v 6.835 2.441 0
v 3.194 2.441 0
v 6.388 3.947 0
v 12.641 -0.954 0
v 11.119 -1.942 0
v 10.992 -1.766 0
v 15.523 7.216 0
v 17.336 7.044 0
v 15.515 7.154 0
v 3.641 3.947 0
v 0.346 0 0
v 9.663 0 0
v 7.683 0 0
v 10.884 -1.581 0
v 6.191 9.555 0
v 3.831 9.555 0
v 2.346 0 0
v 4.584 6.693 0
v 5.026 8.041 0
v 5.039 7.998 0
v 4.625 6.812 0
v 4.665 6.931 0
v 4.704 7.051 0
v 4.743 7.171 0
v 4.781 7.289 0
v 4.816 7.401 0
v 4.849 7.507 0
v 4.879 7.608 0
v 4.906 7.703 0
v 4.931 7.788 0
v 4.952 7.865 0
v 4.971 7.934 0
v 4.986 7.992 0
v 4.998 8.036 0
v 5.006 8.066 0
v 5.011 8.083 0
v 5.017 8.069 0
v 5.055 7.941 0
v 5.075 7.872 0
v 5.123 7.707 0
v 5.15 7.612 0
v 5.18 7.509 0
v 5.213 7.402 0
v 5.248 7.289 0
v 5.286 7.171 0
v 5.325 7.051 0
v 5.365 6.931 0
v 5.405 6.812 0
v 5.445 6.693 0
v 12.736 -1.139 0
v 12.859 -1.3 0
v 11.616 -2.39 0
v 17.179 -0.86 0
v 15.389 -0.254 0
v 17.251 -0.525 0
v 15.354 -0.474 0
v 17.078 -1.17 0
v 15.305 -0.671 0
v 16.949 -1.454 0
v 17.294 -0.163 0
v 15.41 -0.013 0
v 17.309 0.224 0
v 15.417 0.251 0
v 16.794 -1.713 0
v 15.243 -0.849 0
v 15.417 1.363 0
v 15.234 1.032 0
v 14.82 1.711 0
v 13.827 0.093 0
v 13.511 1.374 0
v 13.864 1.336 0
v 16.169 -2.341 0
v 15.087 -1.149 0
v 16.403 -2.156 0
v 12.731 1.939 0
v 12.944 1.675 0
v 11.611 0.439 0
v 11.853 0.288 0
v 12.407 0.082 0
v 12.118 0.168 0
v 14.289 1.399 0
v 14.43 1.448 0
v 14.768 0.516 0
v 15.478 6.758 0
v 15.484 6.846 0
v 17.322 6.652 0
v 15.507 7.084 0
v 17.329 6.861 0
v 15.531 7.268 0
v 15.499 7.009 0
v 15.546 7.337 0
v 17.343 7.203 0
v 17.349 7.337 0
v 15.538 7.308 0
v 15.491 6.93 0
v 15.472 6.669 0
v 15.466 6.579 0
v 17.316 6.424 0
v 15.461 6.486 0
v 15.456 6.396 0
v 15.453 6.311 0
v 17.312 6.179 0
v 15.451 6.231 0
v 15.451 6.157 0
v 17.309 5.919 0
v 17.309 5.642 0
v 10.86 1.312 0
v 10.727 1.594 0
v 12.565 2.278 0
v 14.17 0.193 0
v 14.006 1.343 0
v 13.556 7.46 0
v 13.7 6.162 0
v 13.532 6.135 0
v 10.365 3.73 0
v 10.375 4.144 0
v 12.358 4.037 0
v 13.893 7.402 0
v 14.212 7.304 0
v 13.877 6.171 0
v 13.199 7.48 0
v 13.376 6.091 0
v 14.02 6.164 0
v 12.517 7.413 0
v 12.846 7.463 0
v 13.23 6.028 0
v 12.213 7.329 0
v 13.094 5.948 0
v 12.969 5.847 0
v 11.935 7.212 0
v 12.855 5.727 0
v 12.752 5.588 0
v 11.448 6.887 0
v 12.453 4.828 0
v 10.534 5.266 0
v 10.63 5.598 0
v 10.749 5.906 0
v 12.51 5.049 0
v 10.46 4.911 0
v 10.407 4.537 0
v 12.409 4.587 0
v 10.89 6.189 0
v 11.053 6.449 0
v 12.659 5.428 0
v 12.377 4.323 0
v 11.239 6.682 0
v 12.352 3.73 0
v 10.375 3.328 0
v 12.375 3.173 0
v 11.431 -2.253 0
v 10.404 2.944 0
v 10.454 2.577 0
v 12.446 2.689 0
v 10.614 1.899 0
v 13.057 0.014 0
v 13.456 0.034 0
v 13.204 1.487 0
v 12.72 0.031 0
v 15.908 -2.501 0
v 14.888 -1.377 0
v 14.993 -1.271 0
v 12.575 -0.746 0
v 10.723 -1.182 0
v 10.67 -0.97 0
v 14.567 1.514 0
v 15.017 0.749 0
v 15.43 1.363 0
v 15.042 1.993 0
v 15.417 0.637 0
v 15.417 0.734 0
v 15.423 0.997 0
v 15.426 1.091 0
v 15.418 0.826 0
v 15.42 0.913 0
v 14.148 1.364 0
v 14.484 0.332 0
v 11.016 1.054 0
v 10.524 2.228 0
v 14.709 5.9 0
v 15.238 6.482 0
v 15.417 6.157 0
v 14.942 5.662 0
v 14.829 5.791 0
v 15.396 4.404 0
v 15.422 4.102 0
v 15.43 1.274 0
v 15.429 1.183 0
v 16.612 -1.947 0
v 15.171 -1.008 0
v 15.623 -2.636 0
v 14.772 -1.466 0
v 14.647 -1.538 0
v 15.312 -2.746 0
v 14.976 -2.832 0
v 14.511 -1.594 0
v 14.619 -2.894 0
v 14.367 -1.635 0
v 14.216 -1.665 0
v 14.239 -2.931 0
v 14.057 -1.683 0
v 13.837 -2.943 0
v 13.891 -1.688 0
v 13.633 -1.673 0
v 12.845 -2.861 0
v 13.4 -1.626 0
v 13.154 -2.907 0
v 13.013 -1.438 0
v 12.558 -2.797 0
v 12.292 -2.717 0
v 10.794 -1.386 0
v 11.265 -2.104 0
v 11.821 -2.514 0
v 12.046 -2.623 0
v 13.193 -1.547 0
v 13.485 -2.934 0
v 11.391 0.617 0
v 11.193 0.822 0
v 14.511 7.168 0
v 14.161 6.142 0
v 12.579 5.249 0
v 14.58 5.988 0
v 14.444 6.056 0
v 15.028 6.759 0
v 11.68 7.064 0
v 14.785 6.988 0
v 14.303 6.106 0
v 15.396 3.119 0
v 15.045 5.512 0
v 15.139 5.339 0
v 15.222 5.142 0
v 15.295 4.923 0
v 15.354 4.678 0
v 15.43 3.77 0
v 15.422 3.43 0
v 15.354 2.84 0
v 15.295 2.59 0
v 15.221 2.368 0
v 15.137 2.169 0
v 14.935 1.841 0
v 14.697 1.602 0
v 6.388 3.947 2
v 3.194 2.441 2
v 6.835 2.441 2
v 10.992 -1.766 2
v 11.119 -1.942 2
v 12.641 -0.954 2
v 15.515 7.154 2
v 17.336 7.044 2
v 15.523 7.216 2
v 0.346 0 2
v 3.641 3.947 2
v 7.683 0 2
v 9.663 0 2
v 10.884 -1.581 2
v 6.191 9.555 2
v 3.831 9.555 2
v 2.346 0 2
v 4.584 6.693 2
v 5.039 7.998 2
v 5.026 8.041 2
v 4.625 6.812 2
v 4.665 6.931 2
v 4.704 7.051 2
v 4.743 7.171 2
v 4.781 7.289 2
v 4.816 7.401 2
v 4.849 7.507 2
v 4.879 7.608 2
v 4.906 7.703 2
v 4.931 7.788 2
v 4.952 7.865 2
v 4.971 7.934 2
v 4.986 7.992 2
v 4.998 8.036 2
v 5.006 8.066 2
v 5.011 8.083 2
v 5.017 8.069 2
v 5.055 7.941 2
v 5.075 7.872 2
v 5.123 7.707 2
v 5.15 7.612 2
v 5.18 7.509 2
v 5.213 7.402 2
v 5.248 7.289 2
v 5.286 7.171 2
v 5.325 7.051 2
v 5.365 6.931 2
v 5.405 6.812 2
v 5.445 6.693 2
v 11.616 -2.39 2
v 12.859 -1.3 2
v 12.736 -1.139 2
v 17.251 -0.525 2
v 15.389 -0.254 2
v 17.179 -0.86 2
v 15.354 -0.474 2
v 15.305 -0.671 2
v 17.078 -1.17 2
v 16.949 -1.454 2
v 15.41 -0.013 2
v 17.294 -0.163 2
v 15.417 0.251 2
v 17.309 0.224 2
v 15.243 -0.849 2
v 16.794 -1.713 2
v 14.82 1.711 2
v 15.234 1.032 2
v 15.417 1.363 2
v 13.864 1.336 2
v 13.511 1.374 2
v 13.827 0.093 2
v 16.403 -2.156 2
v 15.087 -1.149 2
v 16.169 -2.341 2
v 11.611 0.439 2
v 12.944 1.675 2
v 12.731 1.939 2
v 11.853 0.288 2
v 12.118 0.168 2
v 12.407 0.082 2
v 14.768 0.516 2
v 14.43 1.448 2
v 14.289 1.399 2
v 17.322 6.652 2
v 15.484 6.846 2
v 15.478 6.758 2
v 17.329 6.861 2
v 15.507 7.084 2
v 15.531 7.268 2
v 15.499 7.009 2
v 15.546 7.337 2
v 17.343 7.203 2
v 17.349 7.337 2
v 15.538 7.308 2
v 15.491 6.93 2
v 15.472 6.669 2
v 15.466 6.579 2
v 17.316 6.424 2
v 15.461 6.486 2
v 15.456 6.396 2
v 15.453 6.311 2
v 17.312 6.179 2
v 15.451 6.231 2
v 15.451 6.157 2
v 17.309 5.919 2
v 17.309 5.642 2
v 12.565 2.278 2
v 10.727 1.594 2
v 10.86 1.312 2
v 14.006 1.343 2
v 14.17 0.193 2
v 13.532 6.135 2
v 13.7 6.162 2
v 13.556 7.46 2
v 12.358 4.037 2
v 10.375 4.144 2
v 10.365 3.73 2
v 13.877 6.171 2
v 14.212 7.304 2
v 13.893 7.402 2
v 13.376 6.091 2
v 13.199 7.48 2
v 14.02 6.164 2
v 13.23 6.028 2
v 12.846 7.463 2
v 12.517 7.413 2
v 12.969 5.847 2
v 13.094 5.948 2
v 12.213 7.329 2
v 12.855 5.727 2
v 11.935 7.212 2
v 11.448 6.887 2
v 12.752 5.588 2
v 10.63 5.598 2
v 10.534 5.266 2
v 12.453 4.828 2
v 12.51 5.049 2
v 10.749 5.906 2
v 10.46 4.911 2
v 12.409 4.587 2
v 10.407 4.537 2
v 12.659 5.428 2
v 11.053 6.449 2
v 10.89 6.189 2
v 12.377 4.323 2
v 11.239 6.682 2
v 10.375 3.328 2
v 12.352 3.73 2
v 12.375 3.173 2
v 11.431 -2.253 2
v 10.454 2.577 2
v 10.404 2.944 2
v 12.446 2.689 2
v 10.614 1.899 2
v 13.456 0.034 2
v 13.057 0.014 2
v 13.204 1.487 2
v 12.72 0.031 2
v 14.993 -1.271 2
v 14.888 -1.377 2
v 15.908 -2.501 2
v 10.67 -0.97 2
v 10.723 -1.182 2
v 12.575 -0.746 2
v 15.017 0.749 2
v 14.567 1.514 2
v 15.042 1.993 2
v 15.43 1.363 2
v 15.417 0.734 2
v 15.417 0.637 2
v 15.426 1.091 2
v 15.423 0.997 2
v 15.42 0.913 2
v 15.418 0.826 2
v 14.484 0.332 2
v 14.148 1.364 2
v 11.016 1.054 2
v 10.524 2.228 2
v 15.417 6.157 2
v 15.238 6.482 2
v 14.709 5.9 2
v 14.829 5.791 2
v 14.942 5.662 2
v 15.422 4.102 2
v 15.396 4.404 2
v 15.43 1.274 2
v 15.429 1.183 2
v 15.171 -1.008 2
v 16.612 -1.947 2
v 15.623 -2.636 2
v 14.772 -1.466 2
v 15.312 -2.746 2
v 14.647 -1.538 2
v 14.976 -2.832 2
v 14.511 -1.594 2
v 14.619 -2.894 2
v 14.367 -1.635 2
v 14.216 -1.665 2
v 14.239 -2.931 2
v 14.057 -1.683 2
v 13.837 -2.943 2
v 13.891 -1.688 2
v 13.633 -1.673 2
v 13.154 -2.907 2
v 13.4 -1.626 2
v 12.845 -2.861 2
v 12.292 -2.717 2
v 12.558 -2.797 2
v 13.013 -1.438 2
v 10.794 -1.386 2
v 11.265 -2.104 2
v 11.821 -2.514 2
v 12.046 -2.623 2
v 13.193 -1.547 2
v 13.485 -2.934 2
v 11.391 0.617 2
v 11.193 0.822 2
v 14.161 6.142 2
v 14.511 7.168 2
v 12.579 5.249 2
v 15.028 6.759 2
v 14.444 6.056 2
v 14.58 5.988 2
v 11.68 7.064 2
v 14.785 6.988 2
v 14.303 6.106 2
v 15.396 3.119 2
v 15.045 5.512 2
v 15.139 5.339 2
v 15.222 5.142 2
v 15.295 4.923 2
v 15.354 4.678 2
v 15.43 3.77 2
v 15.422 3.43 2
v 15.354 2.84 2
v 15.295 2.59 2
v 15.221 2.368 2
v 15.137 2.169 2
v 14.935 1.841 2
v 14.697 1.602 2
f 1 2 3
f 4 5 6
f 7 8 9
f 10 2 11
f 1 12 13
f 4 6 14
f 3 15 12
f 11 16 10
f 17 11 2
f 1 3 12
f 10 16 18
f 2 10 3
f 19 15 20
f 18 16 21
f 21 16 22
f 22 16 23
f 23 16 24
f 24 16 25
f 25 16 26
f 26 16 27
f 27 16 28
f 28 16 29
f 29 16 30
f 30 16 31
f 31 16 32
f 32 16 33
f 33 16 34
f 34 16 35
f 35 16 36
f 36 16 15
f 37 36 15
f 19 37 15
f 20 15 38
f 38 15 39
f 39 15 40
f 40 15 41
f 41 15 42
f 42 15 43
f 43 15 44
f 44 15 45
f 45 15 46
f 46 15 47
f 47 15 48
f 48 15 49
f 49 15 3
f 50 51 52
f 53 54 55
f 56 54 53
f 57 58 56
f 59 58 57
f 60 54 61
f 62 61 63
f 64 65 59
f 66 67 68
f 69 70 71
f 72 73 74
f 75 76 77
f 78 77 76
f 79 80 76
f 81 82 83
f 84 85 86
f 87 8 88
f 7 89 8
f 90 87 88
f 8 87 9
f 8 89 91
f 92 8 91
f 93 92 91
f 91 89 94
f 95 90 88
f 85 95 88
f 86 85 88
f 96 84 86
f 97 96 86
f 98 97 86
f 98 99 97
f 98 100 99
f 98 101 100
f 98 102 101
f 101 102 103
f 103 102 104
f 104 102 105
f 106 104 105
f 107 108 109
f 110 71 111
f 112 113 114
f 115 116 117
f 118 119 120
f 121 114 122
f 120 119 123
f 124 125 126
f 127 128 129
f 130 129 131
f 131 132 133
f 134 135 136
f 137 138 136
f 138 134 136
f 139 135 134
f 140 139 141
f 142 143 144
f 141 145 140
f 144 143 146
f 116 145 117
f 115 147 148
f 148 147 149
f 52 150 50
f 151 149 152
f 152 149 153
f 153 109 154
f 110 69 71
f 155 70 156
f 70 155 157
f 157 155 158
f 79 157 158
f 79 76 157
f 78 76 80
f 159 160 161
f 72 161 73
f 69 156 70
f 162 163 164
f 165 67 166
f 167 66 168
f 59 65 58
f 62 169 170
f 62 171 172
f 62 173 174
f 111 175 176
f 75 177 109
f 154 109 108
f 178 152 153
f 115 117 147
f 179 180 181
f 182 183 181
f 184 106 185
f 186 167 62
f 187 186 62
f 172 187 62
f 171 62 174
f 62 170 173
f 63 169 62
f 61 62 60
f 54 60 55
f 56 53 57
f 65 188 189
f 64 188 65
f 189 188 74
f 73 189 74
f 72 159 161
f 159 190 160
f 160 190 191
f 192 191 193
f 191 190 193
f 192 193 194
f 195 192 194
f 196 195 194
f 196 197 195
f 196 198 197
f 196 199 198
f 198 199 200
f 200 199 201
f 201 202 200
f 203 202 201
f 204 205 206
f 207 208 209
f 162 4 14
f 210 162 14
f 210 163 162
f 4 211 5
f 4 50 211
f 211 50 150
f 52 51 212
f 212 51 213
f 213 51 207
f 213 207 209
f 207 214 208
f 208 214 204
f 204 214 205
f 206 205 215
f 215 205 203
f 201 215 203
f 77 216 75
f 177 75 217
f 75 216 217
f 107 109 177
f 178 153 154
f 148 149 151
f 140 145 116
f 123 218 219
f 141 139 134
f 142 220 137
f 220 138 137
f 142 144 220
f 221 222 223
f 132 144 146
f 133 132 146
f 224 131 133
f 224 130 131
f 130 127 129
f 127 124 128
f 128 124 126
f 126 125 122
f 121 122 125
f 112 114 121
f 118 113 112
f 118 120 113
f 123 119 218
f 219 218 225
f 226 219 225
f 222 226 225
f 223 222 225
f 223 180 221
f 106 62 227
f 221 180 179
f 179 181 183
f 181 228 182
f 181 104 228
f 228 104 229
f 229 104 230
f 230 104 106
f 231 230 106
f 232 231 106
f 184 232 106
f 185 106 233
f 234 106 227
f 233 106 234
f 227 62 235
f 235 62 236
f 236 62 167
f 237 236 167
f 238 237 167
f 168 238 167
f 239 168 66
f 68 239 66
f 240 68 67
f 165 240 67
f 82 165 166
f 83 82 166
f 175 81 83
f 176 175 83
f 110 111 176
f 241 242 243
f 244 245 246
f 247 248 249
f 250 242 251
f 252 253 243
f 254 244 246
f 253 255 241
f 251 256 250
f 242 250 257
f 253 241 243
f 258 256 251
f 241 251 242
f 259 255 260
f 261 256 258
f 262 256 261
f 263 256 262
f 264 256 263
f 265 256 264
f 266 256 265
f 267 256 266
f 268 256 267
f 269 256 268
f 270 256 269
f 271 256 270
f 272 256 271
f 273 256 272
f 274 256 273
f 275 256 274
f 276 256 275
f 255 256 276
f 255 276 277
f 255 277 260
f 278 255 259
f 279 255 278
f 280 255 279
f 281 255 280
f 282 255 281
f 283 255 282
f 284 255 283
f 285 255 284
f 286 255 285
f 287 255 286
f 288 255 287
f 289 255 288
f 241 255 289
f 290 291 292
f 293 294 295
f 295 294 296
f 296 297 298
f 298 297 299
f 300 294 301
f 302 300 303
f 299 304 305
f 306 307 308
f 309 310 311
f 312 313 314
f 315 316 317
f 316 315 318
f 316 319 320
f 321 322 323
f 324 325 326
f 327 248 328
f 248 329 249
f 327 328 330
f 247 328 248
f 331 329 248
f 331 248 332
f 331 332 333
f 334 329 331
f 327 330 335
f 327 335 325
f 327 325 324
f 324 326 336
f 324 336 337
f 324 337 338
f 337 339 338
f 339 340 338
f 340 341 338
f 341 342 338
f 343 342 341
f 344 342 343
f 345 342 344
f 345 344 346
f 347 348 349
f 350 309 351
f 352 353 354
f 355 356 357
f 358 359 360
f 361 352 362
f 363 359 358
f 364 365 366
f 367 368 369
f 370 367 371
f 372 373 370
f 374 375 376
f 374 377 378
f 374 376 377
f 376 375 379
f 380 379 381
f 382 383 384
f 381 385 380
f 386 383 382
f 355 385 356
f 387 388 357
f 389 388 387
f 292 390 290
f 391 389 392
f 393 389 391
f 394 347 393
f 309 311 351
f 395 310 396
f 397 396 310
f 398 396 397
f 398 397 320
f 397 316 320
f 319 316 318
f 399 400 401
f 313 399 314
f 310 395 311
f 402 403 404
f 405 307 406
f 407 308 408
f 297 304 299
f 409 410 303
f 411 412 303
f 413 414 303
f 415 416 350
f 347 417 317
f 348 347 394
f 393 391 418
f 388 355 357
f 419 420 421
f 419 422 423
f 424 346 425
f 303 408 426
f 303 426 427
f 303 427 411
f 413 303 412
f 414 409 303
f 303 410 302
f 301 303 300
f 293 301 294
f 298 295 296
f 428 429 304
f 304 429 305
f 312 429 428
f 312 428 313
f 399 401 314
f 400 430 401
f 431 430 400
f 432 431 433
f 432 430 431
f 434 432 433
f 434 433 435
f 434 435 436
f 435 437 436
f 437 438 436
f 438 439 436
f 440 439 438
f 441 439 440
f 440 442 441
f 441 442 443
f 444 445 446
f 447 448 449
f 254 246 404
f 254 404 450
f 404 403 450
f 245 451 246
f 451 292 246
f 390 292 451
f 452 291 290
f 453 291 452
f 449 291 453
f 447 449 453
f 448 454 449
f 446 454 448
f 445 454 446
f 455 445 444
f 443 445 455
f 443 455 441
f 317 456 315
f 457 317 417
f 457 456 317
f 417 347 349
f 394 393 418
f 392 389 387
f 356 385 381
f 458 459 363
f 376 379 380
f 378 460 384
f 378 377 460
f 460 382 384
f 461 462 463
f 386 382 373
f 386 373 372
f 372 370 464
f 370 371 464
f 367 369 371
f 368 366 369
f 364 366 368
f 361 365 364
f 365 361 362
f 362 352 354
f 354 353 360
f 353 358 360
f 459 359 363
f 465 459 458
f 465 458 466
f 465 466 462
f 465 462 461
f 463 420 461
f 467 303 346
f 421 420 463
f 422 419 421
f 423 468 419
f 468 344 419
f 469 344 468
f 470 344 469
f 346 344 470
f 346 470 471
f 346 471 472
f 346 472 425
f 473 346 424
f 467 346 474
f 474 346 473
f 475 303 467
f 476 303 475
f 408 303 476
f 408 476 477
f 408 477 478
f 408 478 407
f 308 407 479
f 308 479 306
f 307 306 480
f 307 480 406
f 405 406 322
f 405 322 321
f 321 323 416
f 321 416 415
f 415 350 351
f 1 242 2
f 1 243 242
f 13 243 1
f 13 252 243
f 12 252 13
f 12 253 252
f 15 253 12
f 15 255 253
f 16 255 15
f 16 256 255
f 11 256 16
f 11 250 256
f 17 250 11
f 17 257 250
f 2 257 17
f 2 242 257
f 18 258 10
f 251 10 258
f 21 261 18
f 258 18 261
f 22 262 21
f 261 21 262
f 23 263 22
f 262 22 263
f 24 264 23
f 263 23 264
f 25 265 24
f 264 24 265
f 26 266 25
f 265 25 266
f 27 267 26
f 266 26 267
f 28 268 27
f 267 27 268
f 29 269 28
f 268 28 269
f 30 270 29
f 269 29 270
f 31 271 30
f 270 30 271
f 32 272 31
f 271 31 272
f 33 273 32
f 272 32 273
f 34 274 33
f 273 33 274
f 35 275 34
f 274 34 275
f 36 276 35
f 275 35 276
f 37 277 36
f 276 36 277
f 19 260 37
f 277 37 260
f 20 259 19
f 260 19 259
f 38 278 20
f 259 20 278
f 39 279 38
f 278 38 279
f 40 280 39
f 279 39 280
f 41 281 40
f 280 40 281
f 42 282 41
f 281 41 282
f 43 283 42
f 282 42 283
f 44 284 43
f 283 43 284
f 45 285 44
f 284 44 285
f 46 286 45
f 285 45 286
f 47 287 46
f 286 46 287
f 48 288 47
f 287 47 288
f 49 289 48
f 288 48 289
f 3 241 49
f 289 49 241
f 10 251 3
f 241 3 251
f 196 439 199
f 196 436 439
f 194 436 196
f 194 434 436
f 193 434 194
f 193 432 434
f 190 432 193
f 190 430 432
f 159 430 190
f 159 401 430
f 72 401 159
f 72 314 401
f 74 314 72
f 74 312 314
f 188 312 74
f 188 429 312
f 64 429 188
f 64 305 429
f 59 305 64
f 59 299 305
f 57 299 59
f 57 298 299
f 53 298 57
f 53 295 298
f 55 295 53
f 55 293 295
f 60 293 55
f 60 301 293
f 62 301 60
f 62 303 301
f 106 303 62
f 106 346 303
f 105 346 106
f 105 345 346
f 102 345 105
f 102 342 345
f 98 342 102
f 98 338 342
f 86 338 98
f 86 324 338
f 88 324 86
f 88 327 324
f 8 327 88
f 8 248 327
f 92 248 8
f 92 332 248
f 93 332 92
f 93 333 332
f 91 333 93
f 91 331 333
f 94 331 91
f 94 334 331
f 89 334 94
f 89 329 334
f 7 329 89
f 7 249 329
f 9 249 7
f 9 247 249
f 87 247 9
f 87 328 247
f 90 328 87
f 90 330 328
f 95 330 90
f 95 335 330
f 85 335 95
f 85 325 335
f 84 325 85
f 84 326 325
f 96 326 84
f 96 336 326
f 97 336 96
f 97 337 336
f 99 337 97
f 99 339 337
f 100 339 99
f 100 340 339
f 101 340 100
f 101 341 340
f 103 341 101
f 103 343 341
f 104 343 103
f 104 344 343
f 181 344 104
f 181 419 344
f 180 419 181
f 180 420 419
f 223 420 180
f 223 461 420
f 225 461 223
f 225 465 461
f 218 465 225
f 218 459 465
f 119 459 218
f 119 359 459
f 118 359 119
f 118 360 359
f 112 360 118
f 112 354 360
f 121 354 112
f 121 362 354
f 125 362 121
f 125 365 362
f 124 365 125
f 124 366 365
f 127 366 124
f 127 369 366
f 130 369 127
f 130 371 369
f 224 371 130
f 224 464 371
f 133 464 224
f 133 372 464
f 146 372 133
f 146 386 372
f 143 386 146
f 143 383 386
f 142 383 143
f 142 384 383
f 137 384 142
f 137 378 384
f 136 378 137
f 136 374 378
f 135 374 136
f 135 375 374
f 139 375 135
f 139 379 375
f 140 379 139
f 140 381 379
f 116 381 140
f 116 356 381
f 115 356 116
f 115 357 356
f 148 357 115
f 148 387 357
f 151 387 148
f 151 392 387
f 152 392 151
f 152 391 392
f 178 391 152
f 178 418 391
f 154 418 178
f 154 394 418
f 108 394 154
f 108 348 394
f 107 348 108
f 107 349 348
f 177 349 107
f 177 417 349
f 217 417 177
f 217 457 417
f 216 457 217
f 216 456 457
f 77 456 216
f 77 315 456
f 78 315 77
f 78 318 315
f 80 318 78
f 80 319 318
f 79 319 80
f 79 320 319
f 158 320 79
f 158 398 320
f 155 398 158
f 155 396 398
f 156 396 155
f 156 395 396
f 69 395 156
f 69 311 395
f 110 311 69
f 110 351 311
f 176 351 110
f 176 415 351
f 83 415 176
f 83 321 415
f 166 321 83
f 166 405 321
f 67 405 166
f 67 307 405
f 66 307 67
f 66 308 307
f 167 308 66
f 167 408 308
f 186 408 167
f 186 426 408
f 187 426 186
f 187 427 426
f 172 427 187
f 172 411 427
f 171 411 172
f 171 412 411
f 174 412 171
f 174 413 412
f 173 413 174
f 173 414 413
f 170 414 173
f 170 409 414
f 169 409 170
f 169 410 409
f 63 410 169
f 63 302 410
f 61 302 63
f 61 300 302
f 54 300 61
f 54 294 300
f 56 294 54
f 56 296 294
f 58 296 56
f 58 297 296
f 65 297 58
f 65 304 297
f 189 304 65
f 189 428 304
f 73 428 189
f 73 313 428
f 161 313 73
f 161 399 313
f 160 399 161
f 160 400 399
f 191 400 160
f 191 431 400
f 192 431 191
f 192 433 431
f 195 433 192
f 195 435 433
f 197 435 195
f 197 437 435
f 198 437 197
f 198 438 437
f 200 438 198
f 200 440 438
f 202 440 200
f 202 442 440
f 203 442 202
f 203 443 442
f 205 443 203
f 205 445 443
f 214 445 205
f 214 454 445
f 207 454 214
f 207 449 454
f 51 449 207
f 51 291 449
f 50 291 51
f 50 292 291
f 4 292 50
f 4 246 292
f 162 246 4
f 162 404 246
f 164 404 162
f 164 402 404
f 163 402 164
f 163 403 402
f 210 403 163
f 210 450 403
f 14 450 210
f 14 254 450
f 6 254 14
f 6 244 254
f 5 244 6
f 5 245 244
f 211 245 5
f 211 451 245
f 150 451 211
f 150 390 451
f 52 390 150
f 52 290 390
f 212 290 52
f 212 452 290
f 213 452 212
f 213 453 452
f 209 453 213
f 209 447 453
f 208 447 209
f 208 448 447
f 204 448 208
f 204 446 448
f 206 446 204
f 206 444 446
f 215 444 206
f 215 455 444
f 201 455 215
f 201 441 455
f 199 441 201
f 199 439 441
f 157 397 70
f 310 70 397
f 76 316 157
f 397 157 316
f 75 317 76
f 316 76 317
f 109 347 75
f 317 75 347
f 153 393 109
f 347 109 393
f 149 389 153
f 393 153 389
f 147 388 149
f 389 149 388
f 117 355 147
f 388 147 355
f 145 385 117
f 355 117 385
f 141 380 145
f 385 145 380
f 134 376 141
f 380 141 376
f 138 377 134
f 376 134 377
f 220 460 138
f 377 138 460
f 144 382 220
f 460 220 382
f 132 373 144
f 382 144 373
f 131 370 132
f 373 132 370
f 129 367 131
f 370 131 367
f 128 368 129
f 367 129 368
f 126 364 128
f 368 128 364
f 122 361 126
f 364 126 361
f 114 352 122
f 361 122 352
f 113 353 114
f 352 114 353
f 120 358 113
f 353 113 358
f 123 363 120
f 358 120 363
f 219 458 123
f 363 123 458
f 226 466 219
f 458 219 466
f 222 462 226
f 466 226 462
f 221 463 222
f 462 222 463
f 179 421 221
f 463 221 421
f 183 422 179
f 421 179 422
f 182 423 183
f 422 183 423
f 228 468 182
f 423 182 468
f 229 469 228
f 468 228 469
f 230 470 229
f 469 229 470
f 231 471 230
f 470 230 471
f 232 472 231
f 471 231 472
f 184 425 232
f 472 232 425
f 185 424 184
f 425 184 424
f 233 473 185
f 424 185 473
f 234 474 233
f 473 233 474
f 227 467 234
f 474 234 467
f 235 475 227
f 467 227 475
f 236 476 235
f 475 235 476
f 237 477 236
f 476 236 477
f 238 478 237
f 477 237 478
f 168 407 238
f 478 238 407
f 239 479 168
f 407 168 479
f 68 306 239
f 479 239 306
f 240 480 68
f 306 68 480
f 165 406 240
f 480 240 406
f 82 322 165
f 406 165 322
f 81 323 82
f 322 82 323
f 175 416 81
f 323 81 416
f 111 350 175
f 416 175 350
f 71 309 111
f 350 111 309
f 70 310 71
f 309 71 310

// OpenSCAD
// oracle: vol-tol 0.005
linear_extrude(2) text("Ag", font="Liberation Sans:style=Bold");
